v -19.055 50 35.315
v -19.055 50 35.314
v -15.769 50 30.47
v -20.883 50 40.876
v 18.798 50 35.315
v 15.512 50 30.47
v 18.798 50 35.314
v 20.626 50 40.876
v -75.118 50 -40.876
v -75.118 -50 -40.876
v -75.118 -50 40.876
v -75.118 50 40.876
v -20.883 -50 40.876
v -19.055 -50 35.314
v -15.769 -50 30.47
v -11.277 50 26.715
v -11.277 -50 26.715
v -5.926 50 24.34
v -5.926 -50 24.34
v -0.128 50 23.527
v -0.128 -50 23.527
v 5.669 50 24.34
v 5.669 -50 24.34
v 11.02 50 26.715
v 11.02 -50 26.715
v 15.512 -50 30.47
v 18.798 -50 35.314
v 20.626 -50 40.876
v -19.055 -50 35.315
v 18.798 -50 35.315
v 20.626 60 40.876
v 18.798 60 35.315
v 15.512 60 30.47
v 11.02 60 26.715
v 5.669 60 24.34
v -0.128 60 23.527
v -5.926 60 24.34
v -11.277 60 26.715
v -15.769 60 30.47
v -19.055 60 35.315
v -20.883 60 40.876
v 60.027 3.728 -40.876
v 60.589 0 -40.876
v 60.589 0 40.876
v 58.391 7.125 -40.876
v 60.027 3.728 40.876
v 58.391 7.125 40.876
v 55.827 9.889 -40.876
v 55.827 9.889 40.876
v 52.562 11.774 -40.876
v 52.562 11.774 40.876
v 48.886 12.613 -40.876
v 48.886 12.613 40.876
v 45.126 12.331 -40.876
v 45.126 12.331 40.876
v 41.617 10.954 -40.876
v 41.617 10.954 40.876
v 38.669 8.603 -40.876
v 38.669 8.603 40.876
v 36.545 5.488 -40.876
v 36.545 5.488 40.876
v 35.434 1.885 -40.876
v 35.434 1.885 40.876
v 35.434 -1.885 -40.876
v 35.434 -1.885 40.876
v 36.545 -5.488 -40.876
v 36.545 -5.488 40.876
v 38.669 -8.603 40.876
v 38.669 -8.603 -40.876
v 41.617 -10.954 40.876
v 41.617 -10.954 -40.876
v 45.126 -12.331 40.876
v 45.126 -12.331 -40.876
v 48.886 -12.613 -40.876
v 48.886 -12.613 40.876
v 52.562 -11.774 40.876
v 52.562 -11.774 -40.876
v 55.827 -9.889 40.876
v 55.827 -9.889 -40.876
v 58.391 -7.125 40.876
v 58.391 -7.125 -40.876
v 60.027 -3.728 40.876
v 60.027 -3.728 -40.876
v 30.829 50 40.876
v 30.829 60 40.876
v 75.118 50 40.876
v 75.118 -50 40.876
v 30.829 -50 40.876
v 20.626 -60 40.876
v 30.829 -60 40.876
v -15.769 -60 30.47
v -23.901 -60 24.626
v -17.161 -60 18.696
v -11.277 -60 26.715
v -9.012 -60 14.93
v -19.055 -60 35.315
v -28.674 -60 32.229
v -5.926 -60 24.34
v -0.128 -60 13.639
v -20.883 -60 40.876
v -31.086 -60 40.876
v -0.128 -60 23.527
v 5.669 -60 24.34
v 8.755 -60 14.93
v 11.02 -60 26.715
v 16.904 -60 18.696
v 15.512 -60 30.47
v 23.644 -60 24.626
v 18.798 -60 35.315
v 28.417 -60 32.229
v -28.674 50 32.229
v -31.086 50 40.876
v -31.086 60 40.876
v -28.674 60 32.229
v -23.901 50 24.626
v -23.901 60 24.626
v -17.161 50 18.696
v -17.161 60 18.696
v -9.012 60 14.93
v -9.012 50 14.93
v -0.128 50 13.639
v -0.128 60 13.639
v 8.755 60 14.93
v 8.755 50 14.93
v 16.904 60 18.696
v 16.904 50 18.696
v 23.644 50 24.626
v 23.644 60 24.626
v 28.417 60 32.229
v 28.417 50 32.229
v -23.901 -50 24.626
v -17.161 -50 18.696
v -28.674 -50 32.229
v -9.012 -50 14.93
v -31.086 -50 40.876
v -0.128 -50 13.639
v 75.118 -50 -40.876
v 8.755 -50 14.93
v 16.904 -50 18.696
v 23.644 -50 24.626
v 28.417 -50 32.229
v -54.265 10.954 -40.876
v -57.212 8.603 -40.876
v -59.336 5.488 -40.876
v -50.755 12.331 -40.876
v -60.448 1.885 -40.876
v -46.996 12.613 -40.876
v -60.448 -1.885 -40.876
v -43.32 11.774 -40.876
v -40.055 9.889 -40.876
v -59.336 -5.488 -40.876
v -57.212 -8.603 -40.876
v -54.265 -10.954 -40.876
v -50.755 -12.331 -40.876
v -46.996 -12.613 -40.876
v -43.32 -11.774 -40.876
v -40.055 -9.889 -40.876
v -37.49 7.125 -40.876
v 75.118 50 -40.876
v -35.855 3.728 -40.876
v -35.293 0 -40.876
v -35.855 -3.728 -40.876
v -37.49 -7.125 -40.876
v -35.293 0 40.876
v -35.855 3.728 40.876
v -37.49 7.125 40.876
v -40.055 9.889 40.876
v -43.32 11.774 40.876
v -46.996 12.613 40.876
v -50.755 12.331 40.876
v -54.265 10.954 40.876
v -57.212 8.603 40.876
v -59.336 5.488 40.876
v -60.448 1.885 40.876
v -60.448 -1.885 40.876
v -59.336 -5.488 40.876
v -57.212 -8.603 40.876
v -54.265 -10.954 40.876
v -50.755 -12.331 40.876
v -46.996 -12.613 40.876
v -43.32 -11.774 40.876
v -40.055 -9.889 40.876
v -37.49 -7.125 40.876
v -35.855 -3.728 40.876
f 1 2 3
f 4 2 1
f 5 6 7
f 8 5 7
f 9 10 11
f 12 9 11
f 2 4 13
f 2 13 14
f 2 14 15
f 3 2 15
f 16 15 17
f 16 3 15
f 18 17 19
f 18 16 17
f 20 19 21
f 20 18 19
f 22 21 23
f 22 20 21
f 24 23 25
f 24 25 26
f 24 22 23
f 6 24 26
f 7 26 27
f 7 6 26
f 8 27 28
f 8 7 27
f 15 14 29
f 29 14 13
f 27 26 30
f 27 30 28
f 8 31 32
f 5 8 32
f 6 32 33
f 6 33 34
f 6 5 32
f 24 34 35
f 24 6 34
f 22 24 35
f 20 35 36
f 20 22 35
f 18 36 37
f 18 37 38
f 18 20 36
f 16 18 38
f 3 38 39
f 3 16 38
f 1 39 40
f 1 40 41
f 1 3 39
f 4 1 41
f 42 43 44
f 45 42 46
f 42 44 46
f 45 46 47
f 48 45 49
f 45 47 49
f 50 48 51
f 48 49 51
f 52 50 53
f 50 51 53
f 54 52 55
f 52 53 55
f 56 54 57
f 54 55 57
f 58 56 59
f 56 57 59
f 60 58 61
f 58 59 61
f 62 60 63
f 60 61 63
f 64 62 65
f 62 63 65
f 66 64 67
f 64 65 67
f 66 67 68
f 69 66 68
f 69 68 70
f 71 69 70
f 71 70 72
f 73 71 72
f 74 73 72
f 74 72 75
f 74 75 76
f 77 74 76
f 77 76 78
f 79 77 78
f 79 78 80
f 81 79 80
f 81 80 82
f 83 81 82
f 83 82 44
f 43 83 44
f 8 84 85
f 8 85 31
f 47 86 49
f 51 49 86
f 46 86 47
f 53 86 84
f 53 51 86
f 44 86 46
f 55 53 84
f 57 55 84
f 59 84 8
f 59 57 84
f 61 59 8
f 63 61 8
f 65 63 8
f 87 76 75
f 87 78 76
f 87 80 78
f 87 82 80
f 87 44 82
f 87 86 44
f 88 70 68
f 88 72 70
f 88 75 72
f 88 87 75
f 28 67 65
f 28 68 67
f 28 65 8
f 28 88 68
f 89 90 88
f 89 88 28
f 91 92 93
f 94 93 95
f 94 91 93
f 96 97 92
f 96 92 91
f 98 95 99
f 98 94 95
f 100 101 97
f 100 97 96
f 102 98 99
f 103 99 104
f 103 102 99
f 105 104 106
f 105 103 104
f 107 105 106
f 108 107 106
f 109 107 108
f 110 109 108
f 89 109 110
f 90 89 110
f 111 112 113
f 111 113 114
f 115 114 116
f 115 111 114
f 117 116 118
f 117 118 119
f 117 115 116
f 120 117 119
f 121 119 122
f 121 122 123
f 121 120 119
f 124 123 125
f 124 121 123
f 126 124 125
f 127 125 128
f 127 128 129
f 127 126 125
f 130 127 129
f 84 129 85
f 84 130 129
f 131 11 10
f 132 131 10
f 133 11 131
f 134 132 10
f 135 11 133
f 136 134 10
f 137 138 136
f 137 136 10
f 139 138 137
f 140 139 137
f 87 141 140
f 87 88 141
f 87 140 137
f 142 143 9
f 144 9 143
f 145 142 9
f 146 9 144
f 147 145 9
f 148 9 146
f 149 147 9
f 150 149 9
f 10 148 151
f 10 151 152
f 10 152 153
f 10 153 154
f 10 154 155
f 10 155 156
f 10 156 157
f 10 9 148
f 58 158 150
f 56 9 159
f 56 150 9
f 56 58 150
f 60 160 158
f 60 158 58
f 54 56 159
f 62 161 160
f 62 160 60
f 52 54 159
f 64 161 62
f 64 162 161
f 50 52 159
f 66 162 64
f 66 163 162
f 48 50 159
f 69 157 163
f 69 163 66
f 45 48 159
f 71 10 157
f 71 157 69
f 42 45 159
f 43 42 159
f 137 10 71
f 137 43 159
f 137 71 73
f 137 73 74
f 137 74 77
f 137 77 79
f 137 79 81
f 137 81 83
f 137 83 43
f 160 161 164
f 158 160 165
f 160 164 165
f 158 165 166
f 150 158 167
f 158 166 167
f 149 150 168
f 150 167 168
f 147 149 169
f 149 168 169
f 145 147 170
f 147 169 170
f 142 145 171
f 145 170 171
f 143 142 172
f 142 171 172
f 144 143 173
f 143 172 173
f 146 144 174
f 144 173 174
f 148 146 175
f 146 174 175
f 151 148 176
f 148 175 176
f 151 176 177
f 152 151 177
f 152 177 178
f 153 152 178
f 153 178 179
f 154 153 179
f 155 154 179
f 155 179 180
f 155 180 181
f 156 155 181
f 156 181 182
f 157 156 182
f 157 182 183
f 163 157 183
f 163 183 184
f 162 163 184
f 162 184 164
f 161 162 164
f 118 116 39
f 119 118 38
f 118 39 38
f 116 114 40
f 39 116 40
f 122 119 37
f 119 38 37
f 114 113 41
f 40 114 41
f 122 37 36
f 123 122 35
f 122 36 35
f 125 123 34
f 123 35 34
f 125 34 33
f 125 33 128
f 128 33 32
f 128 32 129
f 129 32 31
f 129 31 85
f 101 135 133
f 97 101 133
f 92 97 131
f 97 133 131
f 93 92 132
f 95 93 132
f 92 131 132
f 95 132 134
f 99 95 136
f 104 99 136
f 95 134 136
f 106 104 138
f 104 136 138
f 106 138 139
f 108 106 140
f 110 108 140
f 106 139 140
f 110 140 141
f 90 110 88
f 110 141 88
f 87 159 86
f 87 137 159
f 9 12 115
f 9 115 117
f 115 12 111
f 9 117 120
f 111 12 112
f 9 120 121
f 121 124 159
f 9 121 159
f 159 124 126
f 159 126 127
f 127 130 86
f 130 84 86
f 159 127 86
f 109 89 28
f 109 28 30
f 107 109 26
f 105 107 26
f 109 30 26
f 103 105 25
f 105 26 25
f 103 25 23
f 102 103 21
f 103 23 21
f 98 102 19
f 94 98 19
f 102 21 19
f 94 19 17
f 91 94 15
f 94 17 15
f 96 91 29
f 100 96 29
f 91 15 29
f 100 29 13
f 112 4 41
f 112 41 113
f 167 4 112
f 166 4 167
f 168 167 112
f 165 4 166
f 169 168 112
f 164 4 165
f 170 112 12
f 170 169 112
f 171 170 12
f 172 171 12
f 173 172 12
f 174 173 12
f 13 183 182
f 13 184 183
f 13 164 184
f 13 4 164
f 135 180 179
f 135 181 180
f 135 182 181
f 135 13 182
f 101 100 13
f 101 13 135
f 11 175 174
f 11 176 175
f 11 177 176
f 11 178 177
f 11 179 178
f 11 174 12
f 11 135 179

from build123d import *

# Parameters (mm, degrees)
F0_W     = 150.236324
F0_H     = 81.752524
F1_DEPTH = 50
F3_DEPTH = 166
F5_DEPTH = 10
F7_R     = 12.648051
F7_R_2   = 12.64805
F8_DEPTH = 89.9


with BuildPart() as f1:
    # F0 (on Front) → F1 (new body)
    with BuildSketch(Plane.XZ):
        Rectangle(F0_W, F0_H)
    extrude(amount=F1_DEPTH)

    # F2 (on face) → F3 (cut)
    with BuildSketch(Plane.XZ.offset(50)):
        with BuildLine():
            Line((20.626348, 40.876262), (-20.883331, 40.876262))
            ThreePointArc((-20.883331, 40.876262), (-0.128492, 23.526994), (20.626348, 40.876262))
        make_face()
    extrude(amount=-F3_DEPTH, mode=Mode.SUBTRACT)

    # F4 (on face) → F5 (join)
    with BuildSketch(Plane.XZ.offset(50)):
        with BuildLine():
            ThreePointArc((20.626348, 40.876262), (-0.128492, 23.527007), (-20.883331, 40.876262))
            Line((-20.883331, 40.876262), (-31.085527, 40.876262))
            ThreePointArc((-31.085527, 40.876262), (-0.12849, 13.638671), (30.828548, 40.876262))
            Line((30.828548, 40.876262), (20.626348, 40.876262))
        make_face()
    extrude(amount=F5_DEPTH)

    # F6: F1 across face


with BuildPart() as f1_1:
    add(f1.part)
    add(f1.part.mirror(Plane(origin=(0.005929, 0, -1.550904), x_dir=(1, 0, 0), z_dir=(0, 1, 0))))

    # F7 (on face) → F8 (cut)
    with BuildSketch(Plane.XY.offset(40.876262)):
        with Locations((-47.940791, 0)):
            Circle(F7_R)
        with Locations((47.94079, 0)):
            Circle(F7_R_2)
    extrude(amount=-F8_DEPTH, mode=Mode.SUBTRACT)


solid = f1_1.part
